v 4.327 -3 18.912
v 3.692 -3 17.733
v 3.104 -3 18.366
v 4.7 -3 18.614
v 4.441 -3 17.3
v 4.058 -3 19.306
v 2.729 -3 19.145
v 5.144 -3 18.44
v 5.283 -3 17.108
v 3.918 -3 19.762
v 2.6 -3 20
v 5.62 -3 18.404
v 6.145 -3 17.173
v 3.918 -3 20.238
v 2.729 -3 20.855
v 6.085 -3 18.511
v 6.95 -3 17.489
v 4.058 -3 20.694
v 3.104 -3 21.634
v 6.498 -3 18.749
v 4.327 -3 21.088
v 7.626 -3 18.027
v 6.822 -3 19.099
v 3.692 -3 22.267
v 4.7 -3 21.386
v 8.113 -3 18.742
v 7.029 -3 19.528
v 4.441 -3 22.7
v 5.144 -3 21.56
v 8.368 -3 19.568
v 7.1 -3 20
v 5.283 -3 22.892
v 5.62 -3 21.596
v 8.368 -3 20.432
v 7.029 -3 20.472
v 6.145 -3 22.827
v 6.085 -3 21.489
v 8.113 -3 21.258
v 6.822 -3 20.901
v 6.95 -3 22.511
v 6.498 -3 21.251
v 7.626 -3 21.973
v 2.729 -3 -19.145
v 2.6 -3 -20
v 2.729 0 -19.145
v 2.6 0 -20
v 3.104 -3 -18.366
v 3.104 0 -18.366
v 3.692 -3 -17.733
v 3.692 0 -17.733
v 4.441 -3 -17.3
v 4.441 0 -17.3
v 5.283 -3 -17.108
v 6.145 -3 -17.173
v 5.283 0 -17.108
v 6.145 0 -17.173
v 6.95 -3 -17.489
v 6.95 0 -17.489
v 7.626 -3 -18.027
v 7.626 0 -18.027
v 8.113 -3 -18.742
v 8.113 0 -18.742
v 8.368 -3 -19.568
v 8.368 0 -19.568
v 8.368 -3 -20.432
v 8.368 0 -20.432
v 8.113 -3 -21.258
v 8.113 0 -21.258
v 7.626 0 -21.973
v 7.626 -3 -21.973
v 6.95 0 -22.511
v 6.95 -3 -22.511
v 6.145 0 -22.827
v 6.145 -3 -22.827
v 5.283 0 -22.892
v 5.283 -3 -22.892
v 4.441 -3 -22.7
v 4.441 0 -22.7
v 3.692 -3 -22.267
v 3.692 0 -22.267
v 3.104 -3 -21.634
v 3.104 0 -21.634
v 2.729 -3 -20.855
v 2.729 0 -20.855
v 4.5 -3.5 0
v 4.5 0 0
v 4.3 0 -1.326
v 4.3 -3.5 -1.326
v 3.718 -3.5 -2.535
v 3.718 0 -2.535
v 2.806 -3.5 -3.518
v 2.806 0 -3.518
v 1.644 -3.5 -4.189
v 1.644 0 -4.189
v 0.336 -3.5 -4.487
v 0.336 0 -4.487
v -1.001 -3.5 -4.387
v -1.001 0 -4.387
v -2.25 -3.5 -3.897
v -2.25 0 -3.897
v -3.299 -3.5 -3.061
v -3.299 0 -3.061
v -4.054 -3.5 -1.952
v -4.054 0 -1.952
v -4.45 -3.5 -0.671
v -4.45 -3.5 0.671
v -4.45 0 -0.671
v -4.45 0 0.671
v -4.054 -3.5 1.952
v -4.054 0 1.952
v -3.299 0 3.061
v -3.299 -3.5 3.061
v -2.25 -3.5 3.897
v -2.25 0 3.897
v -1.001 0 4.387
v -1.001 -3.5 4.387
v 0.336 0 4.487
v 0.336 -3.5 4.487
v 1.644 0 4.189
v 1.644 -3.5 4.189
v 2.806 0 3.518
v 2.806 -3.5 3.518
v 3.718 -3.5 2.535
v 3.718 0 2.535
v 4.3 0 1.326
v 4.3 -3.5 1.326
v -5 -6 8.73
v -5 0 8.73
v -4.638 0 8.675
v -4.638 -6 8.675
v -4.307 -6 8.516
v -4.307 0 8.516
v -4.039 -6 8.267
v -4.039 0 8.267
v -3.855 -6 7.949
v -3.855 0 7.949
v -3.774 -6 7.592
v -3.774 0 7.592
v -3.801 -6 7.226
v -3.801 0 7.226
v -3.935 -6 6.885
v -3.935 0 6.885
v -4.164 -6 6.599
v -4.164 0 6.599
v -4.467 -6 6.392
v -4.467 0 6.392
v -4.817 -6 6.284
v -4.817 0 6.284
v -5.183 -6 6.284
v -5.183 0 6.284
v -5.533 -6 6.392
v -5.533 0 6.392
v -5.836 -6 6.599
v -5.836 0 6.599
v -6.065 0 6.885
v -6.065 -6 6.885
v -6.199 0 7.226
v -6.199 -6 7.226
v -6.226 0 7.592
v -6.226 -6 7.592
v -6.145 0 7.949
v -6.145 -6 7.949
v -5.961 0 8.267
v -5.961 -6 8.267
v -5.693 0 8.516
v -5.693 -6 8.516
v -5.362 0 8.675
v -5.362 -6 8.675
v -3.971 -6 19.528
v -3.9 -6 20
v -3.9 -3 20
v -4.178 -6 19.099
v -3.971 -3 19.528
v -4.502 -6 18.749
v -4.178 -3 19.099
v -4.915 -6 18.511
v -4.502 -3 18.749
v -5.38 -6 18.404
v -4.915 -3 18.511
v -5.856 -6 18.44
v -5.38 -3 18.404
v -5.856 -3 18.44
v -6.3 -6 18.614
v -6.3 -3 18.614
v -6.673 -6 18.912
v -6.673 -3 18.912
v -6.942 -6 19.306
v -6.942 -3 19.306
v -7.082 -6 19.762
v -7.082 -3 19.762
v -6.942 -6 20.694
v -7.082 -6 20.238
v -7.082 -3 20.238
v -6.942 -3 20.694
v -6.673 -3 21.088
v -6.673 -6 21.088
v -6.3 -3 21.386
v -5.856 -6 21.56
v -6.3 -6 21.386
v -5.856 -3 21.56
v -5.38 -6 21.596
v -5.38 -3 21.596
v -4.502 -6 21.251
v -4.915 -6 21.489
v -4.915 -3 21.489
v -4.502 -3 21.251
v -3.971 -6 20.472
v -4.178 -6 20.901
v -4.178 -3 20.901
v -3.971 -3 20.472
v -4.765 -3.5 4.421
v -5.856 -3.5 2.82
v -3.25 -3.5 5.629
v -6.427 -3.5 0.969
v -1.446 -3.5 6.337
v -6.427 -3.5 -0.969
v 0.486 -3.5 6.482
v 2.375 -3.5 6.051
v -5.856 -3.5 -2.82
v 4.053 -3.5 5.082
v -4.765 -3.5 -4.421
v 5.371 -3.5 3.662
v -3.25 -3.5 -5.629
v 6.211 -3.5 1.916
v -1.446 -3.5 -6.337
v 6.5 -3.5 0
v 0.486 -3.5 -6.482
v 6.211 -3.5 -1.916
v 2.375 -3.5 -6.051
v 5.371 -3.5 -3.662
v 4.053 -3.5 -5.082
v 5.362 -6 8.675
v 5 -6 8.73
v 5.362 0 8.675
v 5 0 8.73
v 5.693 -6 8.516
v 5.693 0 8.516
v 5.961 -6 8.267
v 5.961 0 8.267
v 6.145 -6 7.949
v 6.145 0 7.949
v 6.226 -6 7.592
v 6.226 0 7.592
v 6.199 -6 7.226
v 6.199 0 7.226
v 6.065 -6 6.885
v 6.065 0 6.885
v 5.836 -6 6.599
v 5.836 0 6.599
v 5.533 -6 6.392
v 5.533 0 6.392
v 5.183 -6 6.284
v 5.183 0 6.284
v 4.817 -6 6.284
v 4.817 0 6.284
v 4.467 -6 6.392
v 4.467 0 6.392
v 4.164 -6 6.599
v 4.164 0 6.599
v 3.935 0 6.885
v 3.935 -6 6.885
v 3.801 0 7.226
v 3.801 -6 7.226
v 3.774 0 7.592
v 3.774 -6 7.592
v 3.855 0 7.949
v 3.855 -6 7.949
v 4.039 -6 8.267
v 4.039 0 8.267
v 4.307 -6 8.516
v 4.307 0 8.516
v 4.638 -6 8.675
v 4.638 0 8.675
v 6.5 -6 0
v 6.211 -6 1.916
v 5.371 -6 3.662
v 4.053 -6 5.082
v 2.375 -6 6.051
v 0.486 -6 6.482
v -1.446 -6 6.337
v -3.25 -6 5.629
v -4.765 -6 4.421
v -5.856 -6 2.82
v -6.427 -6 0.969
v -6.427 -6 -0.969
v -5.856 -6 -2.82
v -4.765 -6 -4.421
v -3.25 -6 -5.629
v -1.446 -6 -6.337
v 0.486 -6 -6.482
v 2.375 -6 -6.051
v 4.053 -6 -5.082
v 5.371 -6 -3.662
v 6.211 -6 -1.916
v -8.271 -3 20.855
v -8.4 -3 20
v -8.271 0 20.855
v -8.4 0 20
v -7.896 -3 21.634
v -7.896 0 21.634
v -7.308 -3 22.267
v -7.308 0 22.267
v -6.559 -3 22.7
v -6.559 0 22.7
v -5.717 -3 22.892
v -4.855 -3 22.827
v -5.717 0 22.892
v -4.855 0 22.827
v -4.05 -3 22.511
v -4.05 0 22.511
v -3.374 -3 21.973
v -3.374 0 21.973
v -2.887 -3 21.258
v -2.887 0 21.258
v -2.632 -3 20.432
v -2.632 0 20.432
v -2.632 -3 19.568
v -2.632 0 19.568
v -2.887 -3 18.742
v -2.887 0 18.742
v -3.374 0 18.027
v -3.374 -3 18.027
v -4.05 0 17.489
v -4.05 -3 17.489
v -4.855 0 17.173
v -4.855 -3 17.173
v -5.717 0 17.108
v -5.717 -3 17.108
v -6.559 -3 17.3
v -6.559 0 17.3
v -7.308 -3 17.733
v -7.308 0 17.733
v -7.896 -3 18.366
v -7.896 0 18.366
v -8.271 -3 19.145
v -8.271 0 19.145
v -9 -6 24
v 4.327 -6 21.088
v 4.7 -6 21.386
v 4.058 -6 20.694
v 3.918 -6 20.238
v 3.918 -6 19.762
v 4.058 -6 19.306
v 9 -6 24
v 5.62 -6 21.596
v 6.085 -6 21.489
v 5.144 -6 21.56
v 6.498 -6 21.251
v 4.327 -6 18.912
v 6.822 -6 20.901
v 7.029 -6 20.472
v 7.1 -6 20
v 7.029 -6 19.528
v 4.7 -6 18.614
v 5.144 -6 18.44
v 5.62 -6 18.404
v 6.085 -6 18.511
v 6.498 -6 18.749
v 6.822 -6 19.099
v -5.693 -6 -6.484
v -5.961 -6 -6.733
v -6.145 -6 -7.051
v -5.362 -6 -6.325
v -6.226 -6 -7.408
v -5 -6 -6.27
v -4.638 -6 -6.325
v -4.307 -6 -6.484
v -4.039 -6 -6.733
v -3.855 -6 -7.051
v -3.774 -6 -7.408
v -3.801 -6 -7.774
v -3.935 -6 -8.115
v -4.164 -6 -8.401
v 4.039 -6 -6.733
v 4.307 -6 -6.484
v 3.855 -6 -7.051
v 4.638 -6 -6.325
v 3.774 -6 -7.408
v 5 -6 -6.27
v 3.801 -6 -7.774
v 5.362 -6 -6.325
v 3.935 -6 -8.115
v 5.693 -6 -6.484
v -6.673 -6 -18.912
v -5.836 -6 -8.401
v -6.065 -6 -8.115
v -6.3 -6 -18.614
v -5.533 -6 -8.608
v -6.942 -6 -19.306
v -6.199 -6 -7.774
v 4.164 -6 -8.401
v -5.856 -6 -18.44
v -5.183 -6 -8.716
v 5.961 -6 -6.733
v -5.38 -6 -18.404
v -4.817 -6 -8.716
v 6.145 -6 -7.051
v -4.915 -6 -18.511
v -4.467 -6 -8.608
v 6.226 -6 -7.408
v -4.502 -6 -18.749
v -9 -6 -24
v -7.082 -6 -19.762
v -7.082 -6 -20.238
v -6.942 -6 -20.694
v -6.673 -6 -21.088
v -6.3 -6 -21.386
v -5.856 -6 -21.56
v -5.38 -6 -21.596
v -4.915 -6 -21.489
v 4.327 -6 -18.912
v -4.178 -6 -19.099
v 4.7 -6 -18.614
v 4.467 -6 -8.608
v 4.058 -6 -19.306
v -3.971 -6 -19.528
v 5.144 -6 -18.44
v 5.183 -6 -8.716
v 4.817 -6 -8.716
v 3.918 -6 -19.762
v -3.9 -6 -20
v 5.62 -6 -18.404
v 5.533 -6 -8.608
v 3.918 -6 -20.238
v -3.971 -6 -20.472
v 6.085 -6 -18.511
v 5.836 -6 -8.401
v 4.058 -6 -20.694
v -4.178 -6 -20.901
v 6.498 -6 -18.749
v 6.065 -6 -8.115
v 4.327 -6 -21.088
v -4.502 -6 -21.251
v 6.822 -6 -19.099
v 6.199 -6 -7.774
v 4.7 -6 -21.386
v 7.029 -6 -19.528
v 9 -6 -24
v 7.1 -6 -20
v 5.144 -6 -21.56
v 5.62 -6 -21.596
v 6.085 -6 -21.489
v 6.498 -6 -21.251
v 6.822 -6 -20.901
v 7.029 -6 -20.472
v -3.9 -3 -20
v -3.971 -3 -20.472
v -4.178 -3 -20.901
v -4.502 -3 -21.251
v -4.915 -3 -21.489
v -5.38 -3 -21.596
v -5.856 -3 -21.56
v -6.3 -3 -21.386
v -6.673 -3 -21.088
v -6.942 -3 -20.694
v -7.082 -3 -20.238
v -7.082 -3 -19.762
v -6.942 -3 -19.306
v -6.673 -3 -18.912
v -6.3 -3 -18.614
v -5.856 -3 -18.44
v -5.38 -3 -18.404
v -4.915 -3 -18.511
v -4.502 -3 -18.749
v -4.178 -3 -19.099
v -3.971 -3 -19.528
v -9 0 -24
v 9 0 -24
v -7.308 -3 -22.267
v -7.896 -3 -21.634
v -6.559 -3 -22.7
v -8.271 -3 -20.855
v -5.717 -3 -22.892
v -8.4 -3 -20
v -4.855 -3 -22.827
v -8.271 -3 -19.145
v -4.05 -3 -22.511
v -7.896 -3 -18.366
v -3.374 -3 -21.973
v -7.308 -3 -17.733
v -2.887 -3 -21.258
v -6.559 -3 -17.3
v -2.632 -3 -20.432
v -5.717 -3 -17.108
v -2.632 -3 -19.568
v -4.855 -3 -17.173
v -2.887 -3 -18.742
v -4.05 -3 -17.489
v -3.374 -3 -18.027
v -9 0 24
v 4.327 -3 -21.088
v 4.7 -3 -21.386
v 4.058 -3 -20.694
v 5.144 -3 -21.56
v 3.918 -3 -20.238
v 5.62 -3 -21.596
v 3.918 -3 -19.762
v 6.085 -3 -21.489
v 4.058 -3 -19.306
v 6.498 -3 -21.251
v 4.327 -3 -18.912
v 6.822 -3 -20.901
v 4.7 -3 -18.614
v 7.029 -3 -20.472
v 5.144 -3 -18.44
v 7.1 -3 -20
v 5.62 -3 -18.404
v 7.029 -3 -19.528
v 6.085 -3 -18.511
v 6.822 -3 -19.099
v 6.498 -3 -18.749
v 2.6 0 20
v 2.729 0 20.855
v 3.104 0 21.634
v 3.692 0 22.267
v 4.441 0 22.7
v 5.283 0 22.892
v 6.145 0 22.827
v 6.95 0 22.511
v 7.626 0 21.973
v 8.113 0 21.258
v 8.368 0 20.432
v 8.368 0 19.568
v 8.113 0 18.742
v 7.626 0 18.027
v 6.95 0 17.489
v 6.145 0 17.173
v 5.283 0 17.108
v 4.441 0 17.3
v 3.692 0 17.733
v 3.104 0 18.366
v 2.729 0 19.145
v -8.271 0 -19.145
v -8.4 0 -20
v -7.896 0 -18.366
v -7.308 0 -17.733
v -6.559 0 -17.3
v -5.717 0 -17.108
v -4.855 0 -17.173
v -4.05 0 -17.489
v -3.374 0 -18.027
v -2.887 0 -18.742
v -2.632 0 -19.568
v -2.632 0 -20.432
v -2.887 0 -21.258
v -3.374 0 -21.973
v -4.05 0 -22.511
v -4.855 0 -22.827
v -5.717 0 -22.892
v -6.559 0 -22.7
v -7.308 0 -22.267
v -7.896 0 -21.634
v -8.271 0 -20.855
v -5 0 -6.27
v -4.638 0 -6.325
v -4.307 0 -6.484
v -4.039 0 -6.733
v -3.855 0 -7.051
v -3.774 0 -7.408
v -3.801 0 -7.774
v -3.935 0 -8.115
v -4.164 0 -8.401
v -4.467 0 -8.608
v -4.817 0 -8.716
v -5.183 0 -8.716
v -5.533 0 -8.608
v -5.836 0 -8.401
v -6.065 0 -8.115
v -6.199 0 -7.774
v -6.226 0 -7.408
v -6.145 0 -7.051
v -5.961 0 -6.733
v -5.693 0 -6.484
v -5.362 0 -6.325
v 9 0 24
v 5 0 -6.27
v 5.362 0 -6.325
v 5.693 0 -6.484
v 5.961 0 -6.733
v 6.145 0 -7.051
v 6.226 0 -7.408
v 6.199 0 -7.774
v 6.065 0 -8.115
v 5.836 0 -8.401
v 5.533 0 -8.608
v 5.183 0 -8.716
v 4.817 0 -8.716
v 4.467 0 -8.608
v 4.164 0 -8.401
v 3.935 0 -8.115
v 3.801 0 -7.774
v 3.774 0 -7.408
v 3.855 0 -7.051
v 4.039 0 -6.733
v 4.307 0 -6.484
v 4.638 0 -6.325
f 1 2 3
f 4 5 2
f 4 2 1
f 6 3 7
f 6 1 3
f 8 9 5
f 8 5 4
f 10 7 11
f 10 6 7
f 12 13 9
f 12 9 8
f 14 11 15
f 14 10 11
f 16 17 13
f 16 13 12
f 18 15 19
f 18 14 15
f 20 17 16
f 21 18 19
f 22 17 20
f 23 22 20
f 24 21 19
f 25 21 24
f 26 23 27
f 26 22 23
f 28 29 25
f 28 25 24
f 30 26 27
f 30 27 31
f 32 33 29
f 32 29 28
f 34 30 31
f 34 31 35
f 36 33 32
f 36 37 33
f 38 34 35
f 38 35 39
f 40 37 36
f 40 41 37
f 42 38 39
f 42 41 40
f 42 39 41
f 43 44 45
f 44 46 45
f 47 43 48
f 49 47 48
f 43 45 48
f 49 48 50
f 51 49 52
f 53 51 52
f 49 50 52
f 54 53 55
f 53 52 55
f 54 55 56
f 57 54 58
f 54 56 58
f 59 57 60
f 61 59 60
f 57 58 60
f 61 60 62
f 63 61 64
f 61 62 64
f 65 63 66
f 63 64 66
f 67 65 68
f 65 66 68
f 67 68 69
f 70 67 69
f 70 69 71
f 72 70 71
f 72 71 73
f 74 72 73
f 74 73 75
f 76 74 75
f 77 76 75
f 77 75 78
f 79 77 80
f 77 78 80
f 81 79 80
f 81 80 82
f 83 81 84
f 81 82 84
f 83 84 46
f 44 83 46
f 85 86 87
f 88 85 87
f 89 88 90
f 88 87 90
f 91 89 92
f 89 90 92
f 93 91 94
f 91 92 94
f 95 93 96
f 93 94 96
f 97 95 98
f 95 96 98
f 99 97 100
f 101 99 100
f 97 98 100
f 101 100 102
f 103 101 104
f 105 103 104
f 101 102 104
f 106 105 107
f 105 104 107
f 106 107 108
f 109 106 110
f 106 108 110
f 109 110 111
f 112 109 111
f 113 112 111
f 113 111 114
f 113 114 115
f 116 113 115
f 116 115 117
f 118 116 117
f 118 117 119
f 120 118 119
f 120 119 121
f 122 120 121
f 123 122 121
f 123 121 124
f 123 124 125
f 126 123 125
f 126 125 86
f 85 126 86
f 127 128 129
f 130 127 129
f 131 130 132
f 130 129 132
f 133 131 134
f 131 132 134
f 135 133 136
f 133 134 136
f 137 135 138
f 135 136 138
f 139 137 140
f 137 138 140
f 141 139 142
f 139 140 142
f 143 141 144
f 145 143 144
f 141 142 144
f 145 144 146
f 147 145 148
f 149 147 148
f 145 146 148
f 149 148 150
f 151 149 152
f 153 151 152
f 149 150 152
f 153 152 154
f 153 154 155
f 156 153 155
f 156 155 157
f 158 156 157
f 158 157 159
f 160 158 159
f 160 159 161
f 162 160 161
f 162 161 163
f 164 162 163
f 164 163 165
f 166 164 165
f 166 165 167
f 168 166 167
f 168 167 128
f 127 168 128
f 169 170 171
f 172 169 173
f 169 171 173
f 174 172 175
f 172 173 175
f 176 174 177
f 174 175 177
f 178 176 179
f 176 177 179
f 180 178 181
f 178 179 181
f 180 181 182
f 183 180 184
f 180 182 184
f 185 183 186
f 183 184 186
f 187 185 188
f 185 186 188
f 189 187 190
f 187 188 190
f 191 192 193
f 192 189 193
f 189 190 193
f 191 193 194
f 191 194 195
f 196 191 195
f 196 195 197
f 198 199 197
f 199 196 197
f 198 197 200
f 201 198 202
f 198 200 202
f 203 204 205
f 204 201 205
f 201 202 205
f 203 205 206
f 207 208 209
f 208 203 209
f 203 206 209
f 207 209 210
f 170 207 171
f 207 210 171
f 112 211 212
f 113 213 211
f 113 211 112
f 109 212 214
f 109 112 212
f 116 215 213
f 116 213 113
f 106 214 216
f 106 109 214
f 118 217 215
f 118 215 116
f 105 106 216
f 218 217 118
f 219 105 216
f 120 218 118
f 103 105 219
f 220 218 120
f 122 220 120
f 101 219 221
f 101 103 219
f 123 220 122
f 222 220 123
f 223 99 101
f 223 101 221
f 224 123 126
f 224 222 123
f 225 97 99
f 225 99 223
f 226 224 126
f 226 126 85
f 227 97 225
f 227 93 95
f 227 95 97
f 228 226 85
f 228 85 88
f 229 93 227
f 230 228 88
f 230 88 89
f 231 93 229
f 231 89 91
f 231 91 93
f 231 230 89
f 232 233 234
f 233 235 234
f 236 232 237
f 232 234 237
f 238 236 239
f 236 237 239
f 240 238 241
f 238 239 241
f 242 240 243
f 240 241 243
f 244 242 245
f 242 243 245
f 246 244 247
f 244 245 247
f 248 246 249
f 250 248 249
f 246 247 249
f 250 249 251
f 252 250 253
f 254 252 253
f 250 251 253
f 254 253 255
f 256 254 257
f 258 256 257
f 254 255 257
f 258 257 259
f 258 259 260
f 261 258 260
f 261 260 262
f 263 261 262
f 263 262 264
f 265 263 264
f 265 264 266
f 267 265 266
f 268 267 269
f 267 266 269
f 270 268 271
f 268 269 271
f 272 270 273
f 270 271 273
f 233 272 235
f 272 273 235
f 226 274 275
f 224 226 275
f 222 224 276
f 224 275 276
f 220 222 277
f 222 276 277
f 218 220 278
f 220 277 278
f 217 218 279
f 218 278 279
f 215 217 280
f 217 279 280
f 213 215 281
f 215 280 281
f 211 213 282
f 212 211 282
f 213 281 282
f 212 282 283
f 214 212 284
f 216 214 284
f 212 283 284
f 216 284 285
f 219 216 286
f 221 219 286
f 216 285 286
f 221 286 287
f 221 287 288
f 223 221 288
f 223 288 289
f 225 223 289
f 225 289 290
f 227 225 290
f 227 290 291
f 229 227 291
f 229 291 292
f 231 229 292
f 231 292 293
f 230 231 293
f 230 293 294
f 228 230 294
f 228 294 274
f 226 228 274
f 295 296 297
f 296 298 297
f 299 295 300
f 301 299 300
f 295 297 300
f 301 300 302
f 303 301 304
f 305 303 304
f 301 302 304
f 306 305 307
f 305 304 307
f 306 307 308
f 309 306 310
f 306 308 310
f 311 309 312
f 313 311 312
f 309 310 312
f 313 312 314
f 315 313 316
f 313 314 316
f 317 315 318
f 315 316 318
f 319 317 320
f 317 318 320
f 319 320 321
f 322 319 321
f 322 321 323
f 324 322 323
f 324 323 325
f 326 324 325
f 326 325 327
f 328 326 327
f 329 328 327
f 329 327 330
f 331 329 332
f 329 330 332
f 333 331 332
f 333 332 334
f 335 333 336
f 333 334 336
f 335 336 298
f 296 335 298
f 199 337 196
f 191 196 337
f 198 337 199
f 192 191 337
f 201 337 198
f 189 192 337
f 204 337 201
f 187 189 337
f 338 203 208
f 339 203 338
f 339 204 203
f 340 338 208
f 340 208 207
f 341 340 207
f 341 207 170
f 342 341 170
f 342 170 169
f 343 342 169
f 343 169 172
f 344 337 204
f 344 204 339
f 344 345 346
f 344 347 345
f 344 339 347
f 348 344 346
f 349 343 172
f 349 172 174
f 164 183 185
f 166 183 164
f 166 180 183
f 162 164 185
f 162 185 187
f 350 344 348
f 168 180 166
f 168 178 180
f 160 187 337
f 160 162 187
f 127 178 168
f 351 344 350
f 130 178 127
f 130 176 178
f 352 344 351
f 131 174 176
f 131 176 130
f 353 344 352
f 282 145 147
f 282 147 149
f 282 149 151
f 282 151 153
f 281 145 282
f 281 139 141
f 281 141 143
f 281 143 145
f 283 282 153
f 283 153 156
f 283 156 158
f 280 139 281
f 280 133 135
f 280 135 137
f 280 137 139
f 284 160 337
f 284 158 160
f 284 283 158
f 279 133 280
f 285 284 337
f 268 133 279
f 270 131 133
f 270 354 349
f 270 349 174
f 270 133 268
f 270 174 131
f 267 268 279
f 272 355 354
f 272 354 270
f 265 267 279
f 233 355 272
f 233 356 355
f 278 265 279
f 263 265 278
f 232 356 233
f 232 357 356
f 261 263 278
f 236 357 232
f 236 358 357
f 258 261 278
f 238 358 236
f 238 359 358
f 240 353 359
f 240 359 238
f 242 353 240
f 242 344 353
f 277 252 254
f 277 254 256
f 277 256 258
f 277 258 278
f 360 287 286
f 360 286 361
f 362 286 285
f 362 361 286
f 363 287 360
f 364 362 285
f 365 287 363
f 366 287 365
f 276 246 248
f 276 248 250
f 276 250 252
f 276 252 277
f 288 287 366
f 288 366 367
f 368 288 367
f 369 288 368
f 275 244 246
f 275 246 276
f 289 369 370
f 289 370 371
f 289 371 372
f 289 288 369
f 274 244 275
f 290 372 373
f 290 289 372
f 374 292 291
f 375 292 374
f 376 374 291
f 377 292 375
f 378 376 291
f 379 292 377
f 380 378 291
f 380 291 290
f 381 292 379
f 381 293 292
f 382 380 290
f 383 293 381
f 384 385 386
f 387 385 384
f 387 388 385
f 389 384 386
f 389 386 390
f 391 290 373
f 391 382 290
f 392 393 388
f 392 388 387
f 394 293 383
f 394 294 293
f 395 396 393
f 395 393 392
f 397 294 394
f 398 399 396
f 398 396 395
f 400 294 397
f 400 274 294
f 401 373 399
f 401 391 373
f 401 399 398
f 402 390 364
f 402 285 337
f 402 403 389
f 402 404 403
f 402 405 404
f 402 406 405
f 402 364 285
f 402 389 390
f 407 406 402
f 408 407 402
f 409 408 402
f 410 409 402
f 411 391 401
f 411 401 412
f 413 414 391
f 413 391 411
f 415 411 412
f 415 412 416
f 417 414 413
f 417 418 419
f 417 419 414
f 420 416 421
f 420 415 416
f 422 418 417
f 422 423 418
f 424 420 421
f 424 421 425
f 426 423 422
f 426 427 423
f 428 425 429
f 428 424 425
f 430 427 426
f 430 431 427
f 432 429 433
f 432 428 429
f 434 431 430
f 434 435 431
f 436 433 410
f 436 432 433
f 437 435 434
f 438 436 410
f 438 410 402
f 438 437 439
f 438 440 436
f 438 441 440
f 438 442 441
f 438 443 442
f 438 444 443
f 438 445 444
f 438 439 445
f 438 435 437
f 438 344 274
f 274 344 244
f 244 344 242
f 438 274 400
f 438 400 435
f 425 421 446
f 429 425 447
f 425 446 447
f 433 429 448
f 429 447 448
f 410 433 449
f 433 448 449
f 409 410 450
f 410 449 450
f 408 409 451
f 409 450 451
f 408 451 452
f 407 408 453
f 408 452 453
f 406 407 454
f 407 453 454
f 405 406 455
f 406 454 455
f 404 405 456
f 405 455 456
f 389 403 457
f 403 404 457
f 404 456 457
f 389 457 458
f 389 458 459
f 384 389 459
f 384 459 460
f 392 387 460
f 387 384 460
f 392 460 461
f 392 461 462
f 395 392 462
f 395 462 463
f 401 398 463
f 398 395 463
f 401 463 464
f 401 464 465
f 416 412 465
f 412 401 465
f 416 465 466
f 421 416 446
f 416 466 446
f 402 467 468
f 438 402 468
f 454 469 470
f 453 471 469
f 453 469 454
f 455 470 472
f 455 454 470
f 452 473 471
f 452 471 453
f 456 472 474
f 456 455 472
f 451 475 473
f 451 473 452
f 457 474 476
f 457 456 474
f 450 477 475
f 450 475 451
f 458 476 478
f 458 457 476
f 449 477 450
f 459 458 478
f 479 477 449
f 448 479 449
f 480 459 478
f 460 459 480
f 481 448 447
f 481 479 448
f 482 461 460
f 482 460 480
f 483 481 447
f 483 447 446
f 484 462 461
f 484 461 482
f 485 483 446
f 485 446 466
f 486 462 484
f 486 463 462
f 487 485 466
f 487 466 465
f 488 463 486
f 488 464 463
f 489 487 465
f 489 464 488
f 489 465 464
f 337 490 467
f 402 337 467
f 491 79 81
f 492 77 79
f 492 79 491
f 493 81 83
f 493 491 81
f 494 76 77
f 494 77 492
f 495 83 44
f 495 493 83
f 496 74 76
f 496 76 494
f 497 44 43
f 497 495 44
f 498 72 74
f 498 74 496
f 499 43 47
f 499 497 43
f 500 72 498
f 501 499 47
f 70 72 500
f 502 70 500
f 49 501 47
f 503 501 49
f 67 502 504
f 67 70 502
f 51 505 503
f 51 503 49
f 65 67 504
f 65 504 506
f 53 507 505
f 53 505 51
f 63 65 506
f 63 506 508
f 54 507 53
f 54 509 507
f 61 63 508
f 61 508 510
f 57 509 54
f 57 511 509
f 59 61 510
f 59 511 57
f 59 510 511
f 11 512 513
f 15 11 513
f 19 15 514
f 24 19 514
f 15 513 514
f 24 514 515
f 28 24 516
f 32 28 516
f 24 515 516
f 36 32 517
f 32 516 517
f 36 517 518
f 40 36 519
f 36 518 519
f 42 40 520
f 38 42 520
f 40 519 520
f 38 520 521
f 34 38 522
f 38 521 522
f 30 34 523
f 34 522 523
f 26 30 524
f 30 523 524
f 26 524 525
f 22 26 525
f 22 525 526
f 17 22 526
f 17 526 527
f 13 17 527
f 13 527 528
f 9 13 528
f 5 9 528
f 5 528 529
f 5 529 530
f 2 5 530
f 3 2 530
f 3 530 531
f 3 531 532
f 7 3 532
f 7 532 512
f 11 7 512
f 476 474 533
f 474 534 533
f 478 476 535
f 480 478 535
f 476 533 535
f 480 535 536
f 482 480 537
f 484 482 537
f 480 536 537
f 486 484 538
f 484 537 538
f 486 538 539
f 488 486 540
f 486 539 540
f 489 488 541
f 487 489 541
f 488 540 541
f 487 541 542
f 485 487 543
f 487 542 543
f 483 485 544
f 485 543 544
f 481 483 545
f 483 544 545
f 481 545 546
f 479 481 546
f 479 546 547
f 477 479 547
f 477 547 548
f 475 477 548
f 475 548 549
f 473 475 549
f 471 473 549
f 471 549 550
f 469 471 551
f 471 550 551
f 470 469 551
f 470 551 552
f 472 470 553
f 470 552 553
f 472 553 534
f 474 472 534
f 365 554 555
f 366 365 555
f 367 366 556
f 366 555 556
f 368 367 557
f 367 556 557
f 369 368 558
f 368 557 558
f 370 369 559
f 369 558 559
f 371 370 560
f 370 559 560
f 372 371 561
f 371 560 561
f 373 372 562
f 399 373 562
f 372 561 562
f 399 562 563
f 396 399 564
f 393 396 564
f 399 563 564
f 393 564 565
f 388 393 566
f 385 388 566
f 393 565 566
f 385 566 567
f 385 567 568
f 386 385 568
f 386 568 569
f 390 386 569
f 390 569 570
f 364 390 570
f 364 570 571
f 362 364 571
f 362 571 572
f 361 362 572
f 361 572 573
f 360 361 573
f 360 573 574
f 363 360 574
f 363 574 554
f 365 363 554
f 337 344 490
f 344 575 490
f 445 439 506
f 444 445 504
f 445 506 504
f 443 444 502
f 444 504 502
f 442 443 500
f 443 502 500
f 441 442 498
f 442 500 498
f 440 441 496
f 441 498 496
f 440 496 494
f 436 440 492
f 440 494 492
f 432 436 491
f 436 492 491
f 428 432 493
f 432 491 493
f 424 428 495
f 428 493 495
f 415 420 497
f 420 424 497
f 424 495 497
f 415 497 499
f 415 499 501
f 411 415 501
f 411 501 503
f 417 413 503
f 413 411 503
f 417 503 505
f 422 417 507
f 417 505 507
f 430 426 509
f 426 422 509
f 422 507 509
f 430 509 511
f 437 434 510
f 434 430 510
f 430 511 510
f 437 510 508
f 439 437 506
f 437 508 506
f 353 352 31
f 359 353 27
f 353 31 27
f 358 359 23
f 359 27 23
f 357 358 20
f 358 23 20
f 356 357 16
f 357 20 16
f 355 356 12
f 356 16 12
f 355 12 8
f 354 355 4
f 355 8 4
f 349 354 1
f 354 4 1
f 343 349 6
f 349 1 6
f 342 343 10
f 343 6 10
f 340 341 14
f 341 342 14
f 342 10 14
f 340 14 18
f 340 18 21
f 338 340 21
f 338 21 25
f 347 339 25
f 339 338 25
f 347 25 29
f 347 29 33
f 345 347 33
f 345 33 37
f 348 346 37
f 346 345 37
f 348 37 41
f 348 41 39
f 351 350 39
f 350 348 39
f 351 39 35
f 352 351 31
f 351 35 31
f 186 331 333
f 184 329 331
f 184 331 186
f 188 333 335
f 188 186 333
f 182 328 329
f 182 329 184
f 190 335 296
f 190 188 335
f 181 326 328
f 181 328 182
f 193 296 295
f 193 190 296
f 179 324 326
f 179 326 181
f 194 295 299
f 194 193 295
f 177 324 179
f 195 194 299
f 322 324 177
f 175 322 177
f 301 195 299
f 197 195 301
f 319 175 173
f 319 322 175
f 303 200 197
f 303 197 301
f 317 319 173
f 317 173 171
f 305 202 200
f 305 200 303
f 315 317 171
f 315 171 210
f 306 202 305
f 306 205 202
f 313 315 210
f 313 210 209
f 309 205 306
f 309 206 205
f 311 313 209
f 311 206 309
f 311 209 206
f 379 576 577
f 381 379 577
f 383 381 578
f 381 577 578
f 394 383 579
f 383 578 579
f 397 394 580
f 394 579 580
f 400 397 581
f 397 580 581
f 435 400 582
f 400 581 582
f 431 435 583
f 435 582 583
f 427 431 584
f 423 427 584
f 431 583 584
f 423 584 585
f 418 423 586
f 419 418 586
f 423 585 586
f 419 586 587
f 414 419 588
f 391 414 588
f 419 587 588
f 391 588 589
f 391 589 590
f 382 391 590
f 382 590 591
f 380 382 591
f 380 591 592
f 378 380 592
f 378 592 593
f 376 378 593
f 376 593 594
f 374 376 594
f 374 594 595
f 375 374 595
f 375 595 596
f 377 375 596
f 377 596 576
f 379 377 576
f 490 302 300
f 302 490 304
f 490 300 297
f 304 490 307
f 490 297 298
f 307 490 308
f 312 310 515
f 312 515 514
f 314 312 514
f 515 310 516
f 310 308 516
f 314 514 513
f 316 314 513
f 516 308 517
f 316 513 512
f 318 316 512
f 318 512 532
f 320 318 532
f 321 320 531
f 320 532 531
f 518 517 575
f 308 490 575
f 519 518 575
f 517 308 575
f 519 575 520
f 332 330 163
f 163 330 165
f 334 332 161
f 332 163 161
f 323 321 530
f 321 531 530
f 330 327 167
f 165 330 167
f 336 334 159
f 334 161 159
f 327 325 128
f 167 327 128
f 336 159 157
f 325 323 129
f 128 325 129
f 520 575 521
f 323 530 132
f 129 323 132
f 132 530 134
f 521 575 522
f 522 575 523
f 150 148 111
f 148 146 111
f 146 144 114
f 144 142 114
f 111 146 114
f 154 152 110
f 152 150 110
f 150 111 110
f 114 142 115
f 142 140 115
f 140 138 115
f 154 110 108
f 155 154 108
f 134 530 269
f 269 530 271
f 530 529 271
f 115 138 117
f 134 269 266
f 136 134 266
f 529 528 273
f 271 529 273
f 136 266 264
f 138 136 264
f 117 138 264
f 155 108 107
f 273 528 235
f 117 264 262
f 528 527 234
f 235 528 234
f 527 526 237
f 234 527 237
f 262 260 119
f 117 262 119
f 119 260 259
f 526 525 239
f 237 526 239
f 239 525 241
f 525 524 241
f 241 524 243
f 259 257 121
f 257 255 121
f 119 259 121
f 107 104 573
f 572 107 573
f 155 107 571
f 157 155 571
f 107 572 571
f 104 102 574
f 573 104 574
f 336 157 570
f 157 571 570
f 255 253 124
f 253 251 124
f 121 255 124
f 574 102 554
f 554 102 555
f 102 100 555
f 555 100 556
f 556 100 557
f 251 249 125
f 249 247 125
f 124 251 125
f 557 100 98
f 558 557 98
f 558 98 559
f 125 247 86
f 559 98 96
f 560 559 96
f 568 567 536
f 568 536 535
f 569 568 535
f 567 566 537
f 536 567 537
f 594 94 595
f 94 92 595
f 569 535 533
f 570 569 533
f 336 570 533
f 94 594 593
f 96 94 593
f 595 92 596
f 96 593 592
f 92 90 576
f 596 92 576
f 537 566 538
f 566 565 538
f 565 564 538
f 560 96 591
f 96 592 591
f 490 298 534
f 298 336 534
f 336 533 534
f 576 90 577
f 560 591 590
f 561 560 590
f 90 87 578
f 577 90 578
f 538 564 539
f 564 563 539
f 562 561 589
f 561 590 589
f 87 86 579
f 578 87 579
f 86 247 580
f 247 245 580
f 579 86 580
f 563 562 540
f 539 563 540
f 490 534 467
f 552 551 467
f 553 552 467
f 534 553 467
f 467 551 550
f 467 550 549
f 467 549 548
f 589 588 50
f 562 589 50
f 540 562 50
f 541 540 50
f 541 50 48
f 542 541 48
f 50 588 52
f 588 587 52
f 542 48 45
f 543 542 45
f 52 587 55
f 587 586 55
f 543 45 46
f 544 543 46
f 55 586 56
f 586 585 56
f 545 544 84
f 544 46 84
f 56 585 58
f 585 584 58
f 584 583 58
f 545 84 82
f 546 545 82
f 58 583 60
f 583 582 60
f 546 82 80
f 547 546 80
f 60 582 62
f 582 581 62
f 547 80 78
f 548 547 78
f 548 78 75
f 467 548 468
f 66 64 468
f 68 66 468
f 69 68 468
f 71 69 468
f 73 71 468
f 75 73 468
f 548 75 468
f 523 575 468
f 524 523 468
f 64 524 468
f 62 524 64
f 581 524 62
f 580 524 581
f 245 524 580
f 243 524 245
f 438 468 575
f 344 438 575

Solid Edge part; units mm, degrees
sketch "Sketch1" plane through (0, 0, 0) normal (0, -1, 0) x (1, 0, 0)
  circle A0 centre (0, 0) radius 4.5
  circle A1 centre (-5.5, 20) radius 1.6
  circle A2 centre (5.5, 20) radius 1.6
  circle A3 centre (-5.5, -20) radius 1.6
  circle A4 centre (5.5, -20) radius 1.6
  line L0 (-9, -24) -> (9, -24)
  line L1 (9, -24) -> (9, 24)
  line L2 (9, 24) -> (-9, 24)
  line L3 (-9, 24) -> (-9, -24)
  dimension "D1" = 48
  dimension "D2" = 18
  dimension "D3" = 40
  dimension "D4" = 20
  dimension "D5" = 11
  dimension "D6" = 5.5
  dimension "D7" = 40
  dimension "D8" = 11
extrude "Protrusion1" add sketch "Sketch1" along normal blind 6
sketch "Sketch2" plane through (0, -6, 0) normal (0, -1, 0) x (1, 0, 0)
  circle A0 centre (0, 0) radius 6.5
extrude "ExtrudedCutout_1" cut sketch "Sketch2" against normal blind 2.5
hole "Hole_5" at (-5, 0, -7.5) direction (0, -1, 0) diameter 2.459 end up to next
hole "Hole1" at (-5, 0, 7.5) direction (0, -1, 0) diameter 2.459 end up to next
hole "Hole2" at (5, 0, 7.5) direction (0, -1, 0) diameter 2.459 end up to next
hole "Hole3" at (5, 0, -7.5) direction (0, -1, 0) diameter 2.459 end up to next
sketch "Sketch3" plane through (0, 0, 0) normal (0, 1, 0) x (-1, 0, 0)
  circle A0 centre (-5.5, -20) radius 2.9
  circle A1 centre (5.5, -20) radius 2.9
  circle A2 centre (5.5, 20) radius 2.9
  circle A3 centre (-5.5, 20) radius 2.9
extrude "ExtrudedCutout_2" cut sketch "Sketch3" against normal blind 3
